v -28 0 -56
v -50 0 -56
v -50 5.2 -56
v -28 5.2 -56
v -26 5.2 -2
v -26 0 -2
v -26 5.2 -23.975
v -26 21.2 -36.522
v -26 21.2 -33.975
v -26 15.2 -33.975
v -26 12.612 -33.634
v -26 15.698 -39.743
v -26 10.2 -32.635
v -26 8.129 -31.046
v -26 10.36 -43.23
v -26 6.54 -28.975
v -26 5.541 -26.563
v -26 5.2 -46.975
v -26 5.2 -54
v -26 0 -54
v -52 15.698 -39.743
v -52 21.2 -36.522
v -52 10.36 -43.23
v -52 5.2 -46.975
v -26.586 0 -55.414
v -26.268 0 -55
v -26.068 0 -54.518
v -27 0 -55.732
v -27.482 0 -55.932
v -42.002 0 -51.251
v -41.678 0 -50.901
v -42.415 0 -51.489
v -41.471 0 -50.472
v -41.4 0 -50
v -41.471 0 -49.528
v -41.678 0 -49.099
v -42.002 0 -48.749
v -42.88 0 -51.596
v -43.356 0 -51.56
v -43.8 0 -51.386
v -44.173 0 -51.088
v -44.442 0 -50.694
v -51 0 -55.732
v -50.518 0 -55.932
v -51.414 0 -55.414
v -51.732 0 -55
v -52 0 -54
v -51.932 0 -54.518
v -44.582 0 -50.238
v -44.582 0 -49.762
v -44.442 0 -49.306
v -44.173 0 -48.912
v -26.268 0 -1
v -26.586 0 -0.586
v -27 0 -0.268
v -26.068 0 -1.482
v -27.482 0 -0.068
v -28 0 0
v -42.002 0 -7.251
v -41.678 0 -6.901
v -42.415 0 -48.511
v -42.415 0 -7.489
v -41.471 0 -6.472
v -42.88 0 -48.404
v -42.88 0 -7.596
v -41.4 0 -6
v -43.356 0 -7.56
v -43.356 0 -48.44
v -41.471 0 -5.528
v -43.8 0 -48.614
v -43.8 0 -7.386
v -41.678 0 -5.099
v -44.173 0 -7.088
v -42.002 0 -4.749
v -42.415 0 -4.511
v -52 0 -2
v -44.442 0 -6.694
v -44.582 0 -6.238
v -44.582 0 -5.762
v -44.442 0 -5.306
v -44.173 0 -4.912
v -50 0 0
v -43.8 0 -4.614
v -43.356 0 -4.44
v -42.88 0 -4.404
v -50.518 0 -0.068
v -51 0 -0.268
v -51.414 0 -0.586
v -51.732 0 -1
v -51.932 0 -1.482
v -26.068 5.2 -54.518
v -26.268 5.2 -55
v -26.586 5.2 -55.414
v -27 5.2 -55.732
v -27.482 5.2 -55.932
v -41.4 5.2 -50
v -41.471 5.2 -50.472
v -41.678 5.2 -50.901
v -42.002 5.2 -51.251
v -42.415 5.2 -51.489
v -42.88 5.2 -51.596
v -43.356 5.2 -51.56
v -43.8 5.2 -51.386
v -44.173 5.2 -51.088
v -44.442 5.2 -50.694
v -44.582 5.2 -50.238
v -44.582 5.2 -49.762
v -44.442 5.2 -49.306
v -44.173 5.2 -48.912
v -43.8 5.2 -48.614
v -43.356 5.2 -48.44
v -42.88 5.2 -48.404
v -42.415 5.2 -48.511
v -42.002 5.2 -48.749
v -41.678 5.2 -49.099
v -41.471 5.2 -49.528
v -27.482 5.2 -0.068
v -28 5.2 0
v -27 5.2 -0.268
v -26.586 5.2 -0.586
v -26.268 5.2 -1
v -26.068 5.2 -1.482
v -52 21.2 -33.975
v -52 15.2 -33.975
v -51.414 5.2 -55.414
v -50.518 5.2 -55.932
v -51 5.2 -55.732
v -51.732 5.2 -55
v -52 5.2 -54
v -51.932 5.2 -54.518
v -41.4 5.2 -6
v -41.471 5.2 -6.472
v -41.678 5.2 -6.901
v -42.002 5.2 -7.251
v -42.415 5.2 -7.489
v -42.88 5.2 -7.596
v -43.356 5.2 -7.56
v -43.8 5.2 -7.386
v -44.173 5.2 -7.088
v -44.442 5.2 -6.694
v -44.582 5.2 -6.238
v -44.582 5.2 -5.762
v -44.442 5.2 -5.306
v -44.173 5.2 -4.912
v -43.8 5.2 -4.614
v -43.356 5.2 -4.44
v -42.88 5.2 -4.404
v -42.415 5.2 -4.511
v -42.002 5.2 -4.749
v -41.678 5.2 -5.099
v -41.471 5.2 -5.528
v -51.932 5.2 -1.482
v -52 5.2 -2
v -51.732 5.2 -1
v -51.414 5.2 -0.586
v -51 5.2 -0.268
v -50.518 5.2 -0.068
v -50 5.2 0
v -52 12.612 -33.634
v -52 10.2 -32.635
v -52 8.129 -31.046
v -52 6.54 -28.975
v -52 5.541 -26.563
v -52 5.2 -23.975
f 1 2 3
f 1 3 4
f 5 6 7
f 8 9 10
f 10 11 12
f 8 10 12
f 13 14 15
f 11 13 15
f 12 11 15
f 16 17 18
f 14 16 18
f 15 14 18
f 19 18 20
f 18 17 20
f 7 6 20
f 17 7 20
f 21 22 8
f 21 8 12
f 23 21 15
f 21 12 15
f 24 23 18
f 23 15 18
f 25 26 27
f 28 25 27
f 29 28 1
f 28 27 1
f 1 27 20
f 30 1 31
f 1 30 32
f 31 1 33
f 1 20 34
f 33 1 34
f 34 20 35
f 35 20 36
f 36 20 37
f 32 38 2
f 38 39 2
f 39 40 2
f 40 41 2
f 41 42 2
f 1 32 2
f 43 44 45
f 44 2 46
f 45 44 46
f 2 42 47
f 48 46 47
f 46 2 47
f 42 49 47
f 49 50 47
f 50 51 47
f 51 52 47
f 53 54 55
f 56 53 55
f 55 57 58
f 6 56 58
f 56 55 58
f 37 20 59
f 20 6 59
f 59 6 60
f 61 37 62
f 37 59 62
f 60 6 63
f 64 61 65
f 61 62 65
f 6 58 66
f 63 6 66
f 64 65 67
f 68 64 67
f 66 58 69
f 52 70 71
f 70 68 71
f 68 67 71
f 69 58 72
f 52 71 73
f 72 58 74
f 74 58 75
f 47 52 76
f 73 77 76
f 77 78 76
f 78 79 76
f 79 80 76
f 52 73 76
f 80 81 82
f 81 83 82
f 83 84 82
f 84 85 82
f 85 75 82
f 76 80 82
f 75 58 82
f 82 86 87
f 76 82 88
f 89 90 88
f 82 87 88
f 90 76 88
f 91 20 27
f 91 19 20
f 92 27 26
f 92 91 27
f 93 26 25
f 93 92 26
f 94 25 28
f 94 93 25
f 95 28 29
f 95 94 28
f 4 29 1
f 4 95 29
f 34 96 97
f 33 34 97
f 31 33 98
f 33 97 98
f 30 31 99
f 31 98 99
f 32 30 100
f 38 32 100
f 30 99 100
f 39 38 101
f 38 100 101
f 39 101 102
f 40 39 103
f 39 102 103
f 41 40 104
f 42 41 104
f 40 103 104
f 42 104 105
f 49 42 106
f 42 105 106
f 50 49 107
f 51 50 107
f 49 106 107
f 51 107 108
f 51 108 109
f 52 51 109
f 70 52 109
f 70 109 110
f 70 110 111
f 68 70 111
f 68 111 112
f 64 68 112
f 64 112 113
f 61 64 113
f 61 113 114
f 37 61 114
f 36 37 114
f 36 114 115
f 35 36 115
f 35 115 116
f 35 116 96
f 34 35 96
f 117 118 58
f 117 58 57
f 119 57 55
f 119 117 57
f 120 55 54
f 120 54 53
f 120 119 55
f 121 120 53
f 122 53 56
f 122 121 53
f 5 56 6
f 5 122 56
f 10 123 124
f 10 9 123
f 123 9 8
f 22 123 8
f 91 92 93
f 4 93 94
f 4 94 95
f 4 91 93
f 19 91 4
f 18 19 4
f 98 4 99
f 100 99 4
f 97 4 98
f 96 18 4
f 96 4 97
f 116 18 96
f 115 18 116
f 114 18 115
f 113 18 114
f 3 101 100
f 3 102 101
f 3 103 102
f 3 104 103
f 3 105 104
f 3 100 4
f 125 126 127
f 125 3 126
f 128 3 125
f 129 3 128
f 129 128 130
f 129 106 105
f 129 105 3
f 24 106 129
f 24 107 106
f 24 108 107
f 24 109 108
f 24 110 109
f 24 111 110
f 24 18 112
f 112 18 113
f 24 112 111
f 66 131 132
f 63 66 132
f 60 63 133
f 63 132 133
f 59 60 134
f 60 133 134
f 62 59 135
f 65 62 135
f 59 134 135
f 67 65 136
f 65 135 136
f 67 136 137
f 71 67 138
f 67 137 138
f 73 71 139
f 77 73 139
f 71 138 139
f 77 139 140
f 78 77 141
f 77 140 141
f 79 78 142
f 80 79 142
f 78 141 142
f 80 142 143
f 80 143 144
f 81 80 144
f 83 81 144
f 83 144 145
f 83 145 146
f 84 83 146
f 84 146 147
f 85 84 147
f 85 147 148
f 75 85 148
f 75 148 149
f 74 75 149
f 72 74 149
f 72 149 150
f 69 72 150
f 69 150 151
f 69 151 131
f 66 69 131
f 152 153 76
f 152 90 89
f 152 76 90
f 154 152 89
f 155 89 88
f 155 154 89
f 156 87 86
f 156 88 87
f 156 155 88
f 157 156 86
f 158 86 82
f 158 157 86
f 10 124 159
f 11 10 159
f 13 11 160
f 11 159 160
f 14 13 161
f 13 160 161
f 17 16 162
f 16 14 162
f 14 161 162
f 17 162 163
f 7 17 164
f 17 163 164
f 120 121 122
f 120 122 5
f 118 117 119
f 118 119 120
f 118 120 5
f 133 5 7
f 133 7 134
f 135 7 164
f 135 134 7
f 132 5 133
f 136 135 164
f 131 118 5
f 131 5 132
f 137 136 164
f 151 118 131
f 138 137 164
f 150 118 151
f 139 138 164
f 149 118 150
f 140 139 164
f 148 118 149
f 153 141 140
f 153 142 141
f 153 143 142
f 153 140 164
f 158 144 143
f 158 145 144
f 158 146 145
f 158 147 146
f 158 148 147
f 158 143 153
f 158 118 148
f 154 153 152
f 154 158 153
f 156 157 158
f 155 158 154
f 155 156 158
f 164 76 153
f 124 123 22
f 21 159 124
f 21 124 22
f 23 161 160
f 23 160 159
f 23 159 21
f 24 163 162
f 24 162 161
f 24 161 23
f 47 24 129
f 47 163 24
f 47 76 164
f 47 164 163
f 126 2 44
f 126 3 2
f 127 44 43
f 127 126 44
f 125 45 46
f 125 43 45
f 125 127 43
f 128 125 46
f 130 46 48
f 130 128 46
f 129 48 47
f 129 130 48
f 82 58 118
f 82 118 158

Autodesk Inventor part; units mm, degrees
ref_plane "YZ Plane" through (0, 0, 0) normal (1, 0, 0) x (0, 1, 0)
ref_plane "XZ Plane" through (0, 0, 0) normal (0, 1, 0) x (-1, 0, 0)
ref_plane "XY Plane" through (0, 0, 0) normal (0, 0, 1) x (1, 0, 0)
sketch "Эскиз1" plane through (0, 0, 0) normal (0, 1, 0) x (-1, 0, 0)
  line L0 (0, 0) -> (52, 0)
  line L1 (52, 0) -> (52, -56)
  line L2 (52, -56) -> (0, -56)
  line L3 (0, -56) -> (0, 0)
  dimension "d0" = 56
  dimension "d9" = 52
extrude "Выдавливание1" add sketch "Эскиз1" along normal blind 5.2
ref_plane "РабПлоскость2" through (0, 3.2, -12) normal (0, -1, 0) x (1, 0, 0)
fillet "Сопряжение1" radius 2 4 edges at (0, 2.6, 0) (0, 2.6, -56) (-52, 2.6, -56) (-52, 2.6, 0)
ref_plane "РабПлоскость1" through (0, 0, -12) normal (1, 0, 0) x (0, 0, -1)
sketch "Эскиз4" plane through (0, 0, -12) normal (1, 0, 0) x (0, 0, -1)
  line L0 (34.9749, 5.2) -> (21.9749, 5.2)
  line L1 (21.9749, 21.2) -> (21.9749, 5.2)
  arc A0 (24.5222, 21.2) -> (34.9749, 5.2) centre (138.2876, 84.1082) ccw
  line L2 (21.9749, 21.2) -> (24.5222, 21.2)
  line L3 (44, 0) -> (44, 5.2) projected
  point P0 (-12, 0)
  dimension "d26" = 13
  dimension "d35" = 130
  dimension "d43" = 9.0251
extrude "Выдавливание4" add sketch "Эскиз4" against normal up to surface (52 mm away)
sketch "Эскиз5" plane through (0, 0, 0) normal (0, -1, 0) x (1, 0, 0)
  line L0 (0, 0) -> (-26, 0)
  line L1 (-26, 0) -> (-26, -56)
  line L2 (-26, -56) -> (0, -56)
  line L3 (0, -56) -> (0, 0)
  dimension "d37" = 26
extrude "Выдавливание5" cut sketch "Эскиз5" against normal blind 34
fillet "Сопряжение4" radius 2 2 edges at (-26, 2.6, 0) (-26, 2.6, -56)
fillet "Сопряжение5" radius 10 1 edges at (-39, 5.2, -33.9749)
sketch "Эскиз6" plane through (0, 5.2, 0) normal (0, 1, 0) x (1, 0, 0)
  circle A0 centre (-43, 6) radius 1.6
  circle A1 centre (-43, 50) radius 1.6
  line L0 (-52, 54) -> (-52, 46.9749) projected
  line L1 (-52, 23.9749) -> (-52, 2) projected
  line L2 (-50, 0) -> (-28, 0) projected
  line L3 (-28, 56) -> (-50, 56) projected
  point P0 (0, 0)
  dimension "d45" = 3.2
  dimension "d46" = 3.2
  dimension "d47" = 9
  dimension "d48" = 9
  dimension "d49" = 6
  dimension "d50" = 6
extrude "Выдавливание6" cut sketch "Эскиз6" against normal blind 40
properties part number "порожек"
